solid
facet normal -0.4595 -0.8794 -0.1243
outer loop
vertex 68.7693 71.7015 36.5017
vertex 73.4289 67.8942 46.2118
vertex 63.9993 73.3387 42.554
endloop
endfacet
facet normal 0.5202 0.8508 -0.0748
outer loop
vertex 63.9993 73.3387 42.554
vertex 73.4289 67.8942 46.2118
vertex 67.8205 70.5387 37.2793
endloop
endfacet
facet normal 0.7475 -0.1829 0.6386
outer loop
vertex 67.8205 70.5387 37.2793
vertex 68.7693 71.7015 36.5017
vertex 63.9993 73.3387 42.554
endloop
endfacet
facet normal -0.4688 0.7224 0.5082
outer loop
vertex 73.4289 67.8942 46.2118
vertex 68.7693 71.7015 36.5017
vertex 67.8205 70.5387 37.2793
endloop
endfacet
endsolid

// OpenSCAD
// Auto-generated auxetic polyhedron
points = [
    [63.999320, 73.338726, 42.554033],
    [73.428903, 67.894217, 46.211809],
    [68.769326, 71.701465, 36.501678],
    [67.820495, 70.538715, 37.279332],
];

faces = [
    [0, 1, 2],
    [3, 1, 0],
    [0, 2, 3],
    [3, 2, 1],
];

polyhedron(points = points, faces = faces);
